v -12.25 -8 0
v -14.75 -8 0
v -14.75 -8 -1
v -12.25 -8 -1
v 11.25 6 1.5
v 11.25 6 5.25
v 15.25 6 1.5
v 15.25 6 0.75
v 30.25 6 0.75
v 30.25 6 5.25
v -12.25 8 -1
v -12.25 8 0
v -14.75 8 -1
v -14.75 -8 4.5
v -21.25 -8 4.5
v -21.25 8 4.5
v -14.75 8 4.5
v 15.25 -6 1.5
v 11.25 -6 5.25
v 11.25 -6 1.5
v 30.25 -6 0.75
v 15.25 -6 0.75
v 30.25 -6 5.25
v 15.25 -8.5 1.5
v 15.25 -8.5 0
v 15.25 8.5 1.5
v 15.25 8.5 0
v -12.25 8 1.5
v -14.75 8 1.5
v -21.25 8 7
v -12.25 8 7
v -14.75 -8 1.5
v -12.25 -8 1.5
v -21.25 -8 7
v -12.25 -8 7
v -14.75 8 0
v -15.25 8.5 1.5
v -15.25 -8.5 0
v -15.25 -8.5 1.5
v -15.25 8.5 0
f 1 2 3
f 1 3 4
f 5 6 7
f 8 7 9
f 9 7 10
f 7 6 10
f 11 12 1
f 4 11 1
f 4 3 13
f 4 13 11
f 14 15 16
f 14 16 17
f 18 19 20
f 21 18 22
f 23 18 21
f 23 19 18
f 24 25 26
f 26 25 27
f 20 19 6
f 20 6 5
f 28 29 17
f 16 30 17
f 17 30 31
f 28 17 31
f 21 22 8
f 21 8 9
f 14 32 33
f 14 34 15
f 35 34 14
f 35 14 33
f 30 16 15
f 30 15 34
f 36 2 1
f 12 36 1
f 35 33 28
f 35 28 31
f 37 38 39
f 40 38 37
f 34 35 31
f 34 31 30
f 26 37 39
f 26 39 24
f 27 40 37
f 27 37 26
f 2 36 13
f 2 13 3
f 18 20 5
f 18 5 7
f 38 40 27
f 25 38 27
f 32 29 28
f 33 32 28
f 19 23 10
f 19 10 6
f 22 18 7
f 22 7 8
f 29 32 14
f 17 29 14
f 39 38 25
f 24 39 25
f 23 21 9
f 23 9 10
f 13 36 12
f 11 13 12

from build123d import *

# Parameters (mm, degrees)
F0_W     = 30.5
F0_H     = 17
F1_DEPTH = 1.5
F4_DEPTH = 12
F6_W     = 2.5
F6_H     = 3
F6_W_2   = 6.5
F6_H_2   = 2.5
F7_DEPTH = 16
F8_W     = 2.5
F8_H     = 16
F9_DEPTH = 1


with BuildPart() as f1:
    # F0 (on Top) → F1 (new body)
    with BuildSketch(Plane.XY):
        Rectangle(F0_W, F0_H)
    extrude(amount=F1_DEPTH)


with BuildPart() as f4:
    # F3 (on offset) → F4 (new body)
    with BuildSketch(Plane.XZ.offset(6)):
        Polygon((11.25, 1.5), (15.25, 1.5), (15.25, 0.75), (30.25, 0.75), (30.25, 5.25), (11.25, 5.25), align=None)
    extrude(amount=-F4_DEPTH)


with BuildPart() as f7:
    # F6 (on offset) → F7 (new body)
    with BuildSketch(Plane.XZ.offset(8)):
        with Locations((-13.5, 3)):
            Rectangle(F6_W, F6_H)
        with Locations((-18, 5.75)):
            Rectangle(F6_W_2, F6_H_2)
        with Locations((-13.5, 5.75)):
            Rectangle(F6_W, F6_H_2)
    extrude(amount=-F7_DEPTH)


with BuildPart() as f9:
    # F8 (on face) → F9 (new body)
    with BuildSketch(Plane(origin=(0, 0, 0), x_dir=(1, 0, 0), z_dir=(0, 0, -1))):
        with Locations((-13.5, 0)):
            Rectangle(F8_W, F8_H)
    extrude(amount=F9_DEPTH)


solid = Compound([f1.part, f4.part, f7.part, f9.part])
